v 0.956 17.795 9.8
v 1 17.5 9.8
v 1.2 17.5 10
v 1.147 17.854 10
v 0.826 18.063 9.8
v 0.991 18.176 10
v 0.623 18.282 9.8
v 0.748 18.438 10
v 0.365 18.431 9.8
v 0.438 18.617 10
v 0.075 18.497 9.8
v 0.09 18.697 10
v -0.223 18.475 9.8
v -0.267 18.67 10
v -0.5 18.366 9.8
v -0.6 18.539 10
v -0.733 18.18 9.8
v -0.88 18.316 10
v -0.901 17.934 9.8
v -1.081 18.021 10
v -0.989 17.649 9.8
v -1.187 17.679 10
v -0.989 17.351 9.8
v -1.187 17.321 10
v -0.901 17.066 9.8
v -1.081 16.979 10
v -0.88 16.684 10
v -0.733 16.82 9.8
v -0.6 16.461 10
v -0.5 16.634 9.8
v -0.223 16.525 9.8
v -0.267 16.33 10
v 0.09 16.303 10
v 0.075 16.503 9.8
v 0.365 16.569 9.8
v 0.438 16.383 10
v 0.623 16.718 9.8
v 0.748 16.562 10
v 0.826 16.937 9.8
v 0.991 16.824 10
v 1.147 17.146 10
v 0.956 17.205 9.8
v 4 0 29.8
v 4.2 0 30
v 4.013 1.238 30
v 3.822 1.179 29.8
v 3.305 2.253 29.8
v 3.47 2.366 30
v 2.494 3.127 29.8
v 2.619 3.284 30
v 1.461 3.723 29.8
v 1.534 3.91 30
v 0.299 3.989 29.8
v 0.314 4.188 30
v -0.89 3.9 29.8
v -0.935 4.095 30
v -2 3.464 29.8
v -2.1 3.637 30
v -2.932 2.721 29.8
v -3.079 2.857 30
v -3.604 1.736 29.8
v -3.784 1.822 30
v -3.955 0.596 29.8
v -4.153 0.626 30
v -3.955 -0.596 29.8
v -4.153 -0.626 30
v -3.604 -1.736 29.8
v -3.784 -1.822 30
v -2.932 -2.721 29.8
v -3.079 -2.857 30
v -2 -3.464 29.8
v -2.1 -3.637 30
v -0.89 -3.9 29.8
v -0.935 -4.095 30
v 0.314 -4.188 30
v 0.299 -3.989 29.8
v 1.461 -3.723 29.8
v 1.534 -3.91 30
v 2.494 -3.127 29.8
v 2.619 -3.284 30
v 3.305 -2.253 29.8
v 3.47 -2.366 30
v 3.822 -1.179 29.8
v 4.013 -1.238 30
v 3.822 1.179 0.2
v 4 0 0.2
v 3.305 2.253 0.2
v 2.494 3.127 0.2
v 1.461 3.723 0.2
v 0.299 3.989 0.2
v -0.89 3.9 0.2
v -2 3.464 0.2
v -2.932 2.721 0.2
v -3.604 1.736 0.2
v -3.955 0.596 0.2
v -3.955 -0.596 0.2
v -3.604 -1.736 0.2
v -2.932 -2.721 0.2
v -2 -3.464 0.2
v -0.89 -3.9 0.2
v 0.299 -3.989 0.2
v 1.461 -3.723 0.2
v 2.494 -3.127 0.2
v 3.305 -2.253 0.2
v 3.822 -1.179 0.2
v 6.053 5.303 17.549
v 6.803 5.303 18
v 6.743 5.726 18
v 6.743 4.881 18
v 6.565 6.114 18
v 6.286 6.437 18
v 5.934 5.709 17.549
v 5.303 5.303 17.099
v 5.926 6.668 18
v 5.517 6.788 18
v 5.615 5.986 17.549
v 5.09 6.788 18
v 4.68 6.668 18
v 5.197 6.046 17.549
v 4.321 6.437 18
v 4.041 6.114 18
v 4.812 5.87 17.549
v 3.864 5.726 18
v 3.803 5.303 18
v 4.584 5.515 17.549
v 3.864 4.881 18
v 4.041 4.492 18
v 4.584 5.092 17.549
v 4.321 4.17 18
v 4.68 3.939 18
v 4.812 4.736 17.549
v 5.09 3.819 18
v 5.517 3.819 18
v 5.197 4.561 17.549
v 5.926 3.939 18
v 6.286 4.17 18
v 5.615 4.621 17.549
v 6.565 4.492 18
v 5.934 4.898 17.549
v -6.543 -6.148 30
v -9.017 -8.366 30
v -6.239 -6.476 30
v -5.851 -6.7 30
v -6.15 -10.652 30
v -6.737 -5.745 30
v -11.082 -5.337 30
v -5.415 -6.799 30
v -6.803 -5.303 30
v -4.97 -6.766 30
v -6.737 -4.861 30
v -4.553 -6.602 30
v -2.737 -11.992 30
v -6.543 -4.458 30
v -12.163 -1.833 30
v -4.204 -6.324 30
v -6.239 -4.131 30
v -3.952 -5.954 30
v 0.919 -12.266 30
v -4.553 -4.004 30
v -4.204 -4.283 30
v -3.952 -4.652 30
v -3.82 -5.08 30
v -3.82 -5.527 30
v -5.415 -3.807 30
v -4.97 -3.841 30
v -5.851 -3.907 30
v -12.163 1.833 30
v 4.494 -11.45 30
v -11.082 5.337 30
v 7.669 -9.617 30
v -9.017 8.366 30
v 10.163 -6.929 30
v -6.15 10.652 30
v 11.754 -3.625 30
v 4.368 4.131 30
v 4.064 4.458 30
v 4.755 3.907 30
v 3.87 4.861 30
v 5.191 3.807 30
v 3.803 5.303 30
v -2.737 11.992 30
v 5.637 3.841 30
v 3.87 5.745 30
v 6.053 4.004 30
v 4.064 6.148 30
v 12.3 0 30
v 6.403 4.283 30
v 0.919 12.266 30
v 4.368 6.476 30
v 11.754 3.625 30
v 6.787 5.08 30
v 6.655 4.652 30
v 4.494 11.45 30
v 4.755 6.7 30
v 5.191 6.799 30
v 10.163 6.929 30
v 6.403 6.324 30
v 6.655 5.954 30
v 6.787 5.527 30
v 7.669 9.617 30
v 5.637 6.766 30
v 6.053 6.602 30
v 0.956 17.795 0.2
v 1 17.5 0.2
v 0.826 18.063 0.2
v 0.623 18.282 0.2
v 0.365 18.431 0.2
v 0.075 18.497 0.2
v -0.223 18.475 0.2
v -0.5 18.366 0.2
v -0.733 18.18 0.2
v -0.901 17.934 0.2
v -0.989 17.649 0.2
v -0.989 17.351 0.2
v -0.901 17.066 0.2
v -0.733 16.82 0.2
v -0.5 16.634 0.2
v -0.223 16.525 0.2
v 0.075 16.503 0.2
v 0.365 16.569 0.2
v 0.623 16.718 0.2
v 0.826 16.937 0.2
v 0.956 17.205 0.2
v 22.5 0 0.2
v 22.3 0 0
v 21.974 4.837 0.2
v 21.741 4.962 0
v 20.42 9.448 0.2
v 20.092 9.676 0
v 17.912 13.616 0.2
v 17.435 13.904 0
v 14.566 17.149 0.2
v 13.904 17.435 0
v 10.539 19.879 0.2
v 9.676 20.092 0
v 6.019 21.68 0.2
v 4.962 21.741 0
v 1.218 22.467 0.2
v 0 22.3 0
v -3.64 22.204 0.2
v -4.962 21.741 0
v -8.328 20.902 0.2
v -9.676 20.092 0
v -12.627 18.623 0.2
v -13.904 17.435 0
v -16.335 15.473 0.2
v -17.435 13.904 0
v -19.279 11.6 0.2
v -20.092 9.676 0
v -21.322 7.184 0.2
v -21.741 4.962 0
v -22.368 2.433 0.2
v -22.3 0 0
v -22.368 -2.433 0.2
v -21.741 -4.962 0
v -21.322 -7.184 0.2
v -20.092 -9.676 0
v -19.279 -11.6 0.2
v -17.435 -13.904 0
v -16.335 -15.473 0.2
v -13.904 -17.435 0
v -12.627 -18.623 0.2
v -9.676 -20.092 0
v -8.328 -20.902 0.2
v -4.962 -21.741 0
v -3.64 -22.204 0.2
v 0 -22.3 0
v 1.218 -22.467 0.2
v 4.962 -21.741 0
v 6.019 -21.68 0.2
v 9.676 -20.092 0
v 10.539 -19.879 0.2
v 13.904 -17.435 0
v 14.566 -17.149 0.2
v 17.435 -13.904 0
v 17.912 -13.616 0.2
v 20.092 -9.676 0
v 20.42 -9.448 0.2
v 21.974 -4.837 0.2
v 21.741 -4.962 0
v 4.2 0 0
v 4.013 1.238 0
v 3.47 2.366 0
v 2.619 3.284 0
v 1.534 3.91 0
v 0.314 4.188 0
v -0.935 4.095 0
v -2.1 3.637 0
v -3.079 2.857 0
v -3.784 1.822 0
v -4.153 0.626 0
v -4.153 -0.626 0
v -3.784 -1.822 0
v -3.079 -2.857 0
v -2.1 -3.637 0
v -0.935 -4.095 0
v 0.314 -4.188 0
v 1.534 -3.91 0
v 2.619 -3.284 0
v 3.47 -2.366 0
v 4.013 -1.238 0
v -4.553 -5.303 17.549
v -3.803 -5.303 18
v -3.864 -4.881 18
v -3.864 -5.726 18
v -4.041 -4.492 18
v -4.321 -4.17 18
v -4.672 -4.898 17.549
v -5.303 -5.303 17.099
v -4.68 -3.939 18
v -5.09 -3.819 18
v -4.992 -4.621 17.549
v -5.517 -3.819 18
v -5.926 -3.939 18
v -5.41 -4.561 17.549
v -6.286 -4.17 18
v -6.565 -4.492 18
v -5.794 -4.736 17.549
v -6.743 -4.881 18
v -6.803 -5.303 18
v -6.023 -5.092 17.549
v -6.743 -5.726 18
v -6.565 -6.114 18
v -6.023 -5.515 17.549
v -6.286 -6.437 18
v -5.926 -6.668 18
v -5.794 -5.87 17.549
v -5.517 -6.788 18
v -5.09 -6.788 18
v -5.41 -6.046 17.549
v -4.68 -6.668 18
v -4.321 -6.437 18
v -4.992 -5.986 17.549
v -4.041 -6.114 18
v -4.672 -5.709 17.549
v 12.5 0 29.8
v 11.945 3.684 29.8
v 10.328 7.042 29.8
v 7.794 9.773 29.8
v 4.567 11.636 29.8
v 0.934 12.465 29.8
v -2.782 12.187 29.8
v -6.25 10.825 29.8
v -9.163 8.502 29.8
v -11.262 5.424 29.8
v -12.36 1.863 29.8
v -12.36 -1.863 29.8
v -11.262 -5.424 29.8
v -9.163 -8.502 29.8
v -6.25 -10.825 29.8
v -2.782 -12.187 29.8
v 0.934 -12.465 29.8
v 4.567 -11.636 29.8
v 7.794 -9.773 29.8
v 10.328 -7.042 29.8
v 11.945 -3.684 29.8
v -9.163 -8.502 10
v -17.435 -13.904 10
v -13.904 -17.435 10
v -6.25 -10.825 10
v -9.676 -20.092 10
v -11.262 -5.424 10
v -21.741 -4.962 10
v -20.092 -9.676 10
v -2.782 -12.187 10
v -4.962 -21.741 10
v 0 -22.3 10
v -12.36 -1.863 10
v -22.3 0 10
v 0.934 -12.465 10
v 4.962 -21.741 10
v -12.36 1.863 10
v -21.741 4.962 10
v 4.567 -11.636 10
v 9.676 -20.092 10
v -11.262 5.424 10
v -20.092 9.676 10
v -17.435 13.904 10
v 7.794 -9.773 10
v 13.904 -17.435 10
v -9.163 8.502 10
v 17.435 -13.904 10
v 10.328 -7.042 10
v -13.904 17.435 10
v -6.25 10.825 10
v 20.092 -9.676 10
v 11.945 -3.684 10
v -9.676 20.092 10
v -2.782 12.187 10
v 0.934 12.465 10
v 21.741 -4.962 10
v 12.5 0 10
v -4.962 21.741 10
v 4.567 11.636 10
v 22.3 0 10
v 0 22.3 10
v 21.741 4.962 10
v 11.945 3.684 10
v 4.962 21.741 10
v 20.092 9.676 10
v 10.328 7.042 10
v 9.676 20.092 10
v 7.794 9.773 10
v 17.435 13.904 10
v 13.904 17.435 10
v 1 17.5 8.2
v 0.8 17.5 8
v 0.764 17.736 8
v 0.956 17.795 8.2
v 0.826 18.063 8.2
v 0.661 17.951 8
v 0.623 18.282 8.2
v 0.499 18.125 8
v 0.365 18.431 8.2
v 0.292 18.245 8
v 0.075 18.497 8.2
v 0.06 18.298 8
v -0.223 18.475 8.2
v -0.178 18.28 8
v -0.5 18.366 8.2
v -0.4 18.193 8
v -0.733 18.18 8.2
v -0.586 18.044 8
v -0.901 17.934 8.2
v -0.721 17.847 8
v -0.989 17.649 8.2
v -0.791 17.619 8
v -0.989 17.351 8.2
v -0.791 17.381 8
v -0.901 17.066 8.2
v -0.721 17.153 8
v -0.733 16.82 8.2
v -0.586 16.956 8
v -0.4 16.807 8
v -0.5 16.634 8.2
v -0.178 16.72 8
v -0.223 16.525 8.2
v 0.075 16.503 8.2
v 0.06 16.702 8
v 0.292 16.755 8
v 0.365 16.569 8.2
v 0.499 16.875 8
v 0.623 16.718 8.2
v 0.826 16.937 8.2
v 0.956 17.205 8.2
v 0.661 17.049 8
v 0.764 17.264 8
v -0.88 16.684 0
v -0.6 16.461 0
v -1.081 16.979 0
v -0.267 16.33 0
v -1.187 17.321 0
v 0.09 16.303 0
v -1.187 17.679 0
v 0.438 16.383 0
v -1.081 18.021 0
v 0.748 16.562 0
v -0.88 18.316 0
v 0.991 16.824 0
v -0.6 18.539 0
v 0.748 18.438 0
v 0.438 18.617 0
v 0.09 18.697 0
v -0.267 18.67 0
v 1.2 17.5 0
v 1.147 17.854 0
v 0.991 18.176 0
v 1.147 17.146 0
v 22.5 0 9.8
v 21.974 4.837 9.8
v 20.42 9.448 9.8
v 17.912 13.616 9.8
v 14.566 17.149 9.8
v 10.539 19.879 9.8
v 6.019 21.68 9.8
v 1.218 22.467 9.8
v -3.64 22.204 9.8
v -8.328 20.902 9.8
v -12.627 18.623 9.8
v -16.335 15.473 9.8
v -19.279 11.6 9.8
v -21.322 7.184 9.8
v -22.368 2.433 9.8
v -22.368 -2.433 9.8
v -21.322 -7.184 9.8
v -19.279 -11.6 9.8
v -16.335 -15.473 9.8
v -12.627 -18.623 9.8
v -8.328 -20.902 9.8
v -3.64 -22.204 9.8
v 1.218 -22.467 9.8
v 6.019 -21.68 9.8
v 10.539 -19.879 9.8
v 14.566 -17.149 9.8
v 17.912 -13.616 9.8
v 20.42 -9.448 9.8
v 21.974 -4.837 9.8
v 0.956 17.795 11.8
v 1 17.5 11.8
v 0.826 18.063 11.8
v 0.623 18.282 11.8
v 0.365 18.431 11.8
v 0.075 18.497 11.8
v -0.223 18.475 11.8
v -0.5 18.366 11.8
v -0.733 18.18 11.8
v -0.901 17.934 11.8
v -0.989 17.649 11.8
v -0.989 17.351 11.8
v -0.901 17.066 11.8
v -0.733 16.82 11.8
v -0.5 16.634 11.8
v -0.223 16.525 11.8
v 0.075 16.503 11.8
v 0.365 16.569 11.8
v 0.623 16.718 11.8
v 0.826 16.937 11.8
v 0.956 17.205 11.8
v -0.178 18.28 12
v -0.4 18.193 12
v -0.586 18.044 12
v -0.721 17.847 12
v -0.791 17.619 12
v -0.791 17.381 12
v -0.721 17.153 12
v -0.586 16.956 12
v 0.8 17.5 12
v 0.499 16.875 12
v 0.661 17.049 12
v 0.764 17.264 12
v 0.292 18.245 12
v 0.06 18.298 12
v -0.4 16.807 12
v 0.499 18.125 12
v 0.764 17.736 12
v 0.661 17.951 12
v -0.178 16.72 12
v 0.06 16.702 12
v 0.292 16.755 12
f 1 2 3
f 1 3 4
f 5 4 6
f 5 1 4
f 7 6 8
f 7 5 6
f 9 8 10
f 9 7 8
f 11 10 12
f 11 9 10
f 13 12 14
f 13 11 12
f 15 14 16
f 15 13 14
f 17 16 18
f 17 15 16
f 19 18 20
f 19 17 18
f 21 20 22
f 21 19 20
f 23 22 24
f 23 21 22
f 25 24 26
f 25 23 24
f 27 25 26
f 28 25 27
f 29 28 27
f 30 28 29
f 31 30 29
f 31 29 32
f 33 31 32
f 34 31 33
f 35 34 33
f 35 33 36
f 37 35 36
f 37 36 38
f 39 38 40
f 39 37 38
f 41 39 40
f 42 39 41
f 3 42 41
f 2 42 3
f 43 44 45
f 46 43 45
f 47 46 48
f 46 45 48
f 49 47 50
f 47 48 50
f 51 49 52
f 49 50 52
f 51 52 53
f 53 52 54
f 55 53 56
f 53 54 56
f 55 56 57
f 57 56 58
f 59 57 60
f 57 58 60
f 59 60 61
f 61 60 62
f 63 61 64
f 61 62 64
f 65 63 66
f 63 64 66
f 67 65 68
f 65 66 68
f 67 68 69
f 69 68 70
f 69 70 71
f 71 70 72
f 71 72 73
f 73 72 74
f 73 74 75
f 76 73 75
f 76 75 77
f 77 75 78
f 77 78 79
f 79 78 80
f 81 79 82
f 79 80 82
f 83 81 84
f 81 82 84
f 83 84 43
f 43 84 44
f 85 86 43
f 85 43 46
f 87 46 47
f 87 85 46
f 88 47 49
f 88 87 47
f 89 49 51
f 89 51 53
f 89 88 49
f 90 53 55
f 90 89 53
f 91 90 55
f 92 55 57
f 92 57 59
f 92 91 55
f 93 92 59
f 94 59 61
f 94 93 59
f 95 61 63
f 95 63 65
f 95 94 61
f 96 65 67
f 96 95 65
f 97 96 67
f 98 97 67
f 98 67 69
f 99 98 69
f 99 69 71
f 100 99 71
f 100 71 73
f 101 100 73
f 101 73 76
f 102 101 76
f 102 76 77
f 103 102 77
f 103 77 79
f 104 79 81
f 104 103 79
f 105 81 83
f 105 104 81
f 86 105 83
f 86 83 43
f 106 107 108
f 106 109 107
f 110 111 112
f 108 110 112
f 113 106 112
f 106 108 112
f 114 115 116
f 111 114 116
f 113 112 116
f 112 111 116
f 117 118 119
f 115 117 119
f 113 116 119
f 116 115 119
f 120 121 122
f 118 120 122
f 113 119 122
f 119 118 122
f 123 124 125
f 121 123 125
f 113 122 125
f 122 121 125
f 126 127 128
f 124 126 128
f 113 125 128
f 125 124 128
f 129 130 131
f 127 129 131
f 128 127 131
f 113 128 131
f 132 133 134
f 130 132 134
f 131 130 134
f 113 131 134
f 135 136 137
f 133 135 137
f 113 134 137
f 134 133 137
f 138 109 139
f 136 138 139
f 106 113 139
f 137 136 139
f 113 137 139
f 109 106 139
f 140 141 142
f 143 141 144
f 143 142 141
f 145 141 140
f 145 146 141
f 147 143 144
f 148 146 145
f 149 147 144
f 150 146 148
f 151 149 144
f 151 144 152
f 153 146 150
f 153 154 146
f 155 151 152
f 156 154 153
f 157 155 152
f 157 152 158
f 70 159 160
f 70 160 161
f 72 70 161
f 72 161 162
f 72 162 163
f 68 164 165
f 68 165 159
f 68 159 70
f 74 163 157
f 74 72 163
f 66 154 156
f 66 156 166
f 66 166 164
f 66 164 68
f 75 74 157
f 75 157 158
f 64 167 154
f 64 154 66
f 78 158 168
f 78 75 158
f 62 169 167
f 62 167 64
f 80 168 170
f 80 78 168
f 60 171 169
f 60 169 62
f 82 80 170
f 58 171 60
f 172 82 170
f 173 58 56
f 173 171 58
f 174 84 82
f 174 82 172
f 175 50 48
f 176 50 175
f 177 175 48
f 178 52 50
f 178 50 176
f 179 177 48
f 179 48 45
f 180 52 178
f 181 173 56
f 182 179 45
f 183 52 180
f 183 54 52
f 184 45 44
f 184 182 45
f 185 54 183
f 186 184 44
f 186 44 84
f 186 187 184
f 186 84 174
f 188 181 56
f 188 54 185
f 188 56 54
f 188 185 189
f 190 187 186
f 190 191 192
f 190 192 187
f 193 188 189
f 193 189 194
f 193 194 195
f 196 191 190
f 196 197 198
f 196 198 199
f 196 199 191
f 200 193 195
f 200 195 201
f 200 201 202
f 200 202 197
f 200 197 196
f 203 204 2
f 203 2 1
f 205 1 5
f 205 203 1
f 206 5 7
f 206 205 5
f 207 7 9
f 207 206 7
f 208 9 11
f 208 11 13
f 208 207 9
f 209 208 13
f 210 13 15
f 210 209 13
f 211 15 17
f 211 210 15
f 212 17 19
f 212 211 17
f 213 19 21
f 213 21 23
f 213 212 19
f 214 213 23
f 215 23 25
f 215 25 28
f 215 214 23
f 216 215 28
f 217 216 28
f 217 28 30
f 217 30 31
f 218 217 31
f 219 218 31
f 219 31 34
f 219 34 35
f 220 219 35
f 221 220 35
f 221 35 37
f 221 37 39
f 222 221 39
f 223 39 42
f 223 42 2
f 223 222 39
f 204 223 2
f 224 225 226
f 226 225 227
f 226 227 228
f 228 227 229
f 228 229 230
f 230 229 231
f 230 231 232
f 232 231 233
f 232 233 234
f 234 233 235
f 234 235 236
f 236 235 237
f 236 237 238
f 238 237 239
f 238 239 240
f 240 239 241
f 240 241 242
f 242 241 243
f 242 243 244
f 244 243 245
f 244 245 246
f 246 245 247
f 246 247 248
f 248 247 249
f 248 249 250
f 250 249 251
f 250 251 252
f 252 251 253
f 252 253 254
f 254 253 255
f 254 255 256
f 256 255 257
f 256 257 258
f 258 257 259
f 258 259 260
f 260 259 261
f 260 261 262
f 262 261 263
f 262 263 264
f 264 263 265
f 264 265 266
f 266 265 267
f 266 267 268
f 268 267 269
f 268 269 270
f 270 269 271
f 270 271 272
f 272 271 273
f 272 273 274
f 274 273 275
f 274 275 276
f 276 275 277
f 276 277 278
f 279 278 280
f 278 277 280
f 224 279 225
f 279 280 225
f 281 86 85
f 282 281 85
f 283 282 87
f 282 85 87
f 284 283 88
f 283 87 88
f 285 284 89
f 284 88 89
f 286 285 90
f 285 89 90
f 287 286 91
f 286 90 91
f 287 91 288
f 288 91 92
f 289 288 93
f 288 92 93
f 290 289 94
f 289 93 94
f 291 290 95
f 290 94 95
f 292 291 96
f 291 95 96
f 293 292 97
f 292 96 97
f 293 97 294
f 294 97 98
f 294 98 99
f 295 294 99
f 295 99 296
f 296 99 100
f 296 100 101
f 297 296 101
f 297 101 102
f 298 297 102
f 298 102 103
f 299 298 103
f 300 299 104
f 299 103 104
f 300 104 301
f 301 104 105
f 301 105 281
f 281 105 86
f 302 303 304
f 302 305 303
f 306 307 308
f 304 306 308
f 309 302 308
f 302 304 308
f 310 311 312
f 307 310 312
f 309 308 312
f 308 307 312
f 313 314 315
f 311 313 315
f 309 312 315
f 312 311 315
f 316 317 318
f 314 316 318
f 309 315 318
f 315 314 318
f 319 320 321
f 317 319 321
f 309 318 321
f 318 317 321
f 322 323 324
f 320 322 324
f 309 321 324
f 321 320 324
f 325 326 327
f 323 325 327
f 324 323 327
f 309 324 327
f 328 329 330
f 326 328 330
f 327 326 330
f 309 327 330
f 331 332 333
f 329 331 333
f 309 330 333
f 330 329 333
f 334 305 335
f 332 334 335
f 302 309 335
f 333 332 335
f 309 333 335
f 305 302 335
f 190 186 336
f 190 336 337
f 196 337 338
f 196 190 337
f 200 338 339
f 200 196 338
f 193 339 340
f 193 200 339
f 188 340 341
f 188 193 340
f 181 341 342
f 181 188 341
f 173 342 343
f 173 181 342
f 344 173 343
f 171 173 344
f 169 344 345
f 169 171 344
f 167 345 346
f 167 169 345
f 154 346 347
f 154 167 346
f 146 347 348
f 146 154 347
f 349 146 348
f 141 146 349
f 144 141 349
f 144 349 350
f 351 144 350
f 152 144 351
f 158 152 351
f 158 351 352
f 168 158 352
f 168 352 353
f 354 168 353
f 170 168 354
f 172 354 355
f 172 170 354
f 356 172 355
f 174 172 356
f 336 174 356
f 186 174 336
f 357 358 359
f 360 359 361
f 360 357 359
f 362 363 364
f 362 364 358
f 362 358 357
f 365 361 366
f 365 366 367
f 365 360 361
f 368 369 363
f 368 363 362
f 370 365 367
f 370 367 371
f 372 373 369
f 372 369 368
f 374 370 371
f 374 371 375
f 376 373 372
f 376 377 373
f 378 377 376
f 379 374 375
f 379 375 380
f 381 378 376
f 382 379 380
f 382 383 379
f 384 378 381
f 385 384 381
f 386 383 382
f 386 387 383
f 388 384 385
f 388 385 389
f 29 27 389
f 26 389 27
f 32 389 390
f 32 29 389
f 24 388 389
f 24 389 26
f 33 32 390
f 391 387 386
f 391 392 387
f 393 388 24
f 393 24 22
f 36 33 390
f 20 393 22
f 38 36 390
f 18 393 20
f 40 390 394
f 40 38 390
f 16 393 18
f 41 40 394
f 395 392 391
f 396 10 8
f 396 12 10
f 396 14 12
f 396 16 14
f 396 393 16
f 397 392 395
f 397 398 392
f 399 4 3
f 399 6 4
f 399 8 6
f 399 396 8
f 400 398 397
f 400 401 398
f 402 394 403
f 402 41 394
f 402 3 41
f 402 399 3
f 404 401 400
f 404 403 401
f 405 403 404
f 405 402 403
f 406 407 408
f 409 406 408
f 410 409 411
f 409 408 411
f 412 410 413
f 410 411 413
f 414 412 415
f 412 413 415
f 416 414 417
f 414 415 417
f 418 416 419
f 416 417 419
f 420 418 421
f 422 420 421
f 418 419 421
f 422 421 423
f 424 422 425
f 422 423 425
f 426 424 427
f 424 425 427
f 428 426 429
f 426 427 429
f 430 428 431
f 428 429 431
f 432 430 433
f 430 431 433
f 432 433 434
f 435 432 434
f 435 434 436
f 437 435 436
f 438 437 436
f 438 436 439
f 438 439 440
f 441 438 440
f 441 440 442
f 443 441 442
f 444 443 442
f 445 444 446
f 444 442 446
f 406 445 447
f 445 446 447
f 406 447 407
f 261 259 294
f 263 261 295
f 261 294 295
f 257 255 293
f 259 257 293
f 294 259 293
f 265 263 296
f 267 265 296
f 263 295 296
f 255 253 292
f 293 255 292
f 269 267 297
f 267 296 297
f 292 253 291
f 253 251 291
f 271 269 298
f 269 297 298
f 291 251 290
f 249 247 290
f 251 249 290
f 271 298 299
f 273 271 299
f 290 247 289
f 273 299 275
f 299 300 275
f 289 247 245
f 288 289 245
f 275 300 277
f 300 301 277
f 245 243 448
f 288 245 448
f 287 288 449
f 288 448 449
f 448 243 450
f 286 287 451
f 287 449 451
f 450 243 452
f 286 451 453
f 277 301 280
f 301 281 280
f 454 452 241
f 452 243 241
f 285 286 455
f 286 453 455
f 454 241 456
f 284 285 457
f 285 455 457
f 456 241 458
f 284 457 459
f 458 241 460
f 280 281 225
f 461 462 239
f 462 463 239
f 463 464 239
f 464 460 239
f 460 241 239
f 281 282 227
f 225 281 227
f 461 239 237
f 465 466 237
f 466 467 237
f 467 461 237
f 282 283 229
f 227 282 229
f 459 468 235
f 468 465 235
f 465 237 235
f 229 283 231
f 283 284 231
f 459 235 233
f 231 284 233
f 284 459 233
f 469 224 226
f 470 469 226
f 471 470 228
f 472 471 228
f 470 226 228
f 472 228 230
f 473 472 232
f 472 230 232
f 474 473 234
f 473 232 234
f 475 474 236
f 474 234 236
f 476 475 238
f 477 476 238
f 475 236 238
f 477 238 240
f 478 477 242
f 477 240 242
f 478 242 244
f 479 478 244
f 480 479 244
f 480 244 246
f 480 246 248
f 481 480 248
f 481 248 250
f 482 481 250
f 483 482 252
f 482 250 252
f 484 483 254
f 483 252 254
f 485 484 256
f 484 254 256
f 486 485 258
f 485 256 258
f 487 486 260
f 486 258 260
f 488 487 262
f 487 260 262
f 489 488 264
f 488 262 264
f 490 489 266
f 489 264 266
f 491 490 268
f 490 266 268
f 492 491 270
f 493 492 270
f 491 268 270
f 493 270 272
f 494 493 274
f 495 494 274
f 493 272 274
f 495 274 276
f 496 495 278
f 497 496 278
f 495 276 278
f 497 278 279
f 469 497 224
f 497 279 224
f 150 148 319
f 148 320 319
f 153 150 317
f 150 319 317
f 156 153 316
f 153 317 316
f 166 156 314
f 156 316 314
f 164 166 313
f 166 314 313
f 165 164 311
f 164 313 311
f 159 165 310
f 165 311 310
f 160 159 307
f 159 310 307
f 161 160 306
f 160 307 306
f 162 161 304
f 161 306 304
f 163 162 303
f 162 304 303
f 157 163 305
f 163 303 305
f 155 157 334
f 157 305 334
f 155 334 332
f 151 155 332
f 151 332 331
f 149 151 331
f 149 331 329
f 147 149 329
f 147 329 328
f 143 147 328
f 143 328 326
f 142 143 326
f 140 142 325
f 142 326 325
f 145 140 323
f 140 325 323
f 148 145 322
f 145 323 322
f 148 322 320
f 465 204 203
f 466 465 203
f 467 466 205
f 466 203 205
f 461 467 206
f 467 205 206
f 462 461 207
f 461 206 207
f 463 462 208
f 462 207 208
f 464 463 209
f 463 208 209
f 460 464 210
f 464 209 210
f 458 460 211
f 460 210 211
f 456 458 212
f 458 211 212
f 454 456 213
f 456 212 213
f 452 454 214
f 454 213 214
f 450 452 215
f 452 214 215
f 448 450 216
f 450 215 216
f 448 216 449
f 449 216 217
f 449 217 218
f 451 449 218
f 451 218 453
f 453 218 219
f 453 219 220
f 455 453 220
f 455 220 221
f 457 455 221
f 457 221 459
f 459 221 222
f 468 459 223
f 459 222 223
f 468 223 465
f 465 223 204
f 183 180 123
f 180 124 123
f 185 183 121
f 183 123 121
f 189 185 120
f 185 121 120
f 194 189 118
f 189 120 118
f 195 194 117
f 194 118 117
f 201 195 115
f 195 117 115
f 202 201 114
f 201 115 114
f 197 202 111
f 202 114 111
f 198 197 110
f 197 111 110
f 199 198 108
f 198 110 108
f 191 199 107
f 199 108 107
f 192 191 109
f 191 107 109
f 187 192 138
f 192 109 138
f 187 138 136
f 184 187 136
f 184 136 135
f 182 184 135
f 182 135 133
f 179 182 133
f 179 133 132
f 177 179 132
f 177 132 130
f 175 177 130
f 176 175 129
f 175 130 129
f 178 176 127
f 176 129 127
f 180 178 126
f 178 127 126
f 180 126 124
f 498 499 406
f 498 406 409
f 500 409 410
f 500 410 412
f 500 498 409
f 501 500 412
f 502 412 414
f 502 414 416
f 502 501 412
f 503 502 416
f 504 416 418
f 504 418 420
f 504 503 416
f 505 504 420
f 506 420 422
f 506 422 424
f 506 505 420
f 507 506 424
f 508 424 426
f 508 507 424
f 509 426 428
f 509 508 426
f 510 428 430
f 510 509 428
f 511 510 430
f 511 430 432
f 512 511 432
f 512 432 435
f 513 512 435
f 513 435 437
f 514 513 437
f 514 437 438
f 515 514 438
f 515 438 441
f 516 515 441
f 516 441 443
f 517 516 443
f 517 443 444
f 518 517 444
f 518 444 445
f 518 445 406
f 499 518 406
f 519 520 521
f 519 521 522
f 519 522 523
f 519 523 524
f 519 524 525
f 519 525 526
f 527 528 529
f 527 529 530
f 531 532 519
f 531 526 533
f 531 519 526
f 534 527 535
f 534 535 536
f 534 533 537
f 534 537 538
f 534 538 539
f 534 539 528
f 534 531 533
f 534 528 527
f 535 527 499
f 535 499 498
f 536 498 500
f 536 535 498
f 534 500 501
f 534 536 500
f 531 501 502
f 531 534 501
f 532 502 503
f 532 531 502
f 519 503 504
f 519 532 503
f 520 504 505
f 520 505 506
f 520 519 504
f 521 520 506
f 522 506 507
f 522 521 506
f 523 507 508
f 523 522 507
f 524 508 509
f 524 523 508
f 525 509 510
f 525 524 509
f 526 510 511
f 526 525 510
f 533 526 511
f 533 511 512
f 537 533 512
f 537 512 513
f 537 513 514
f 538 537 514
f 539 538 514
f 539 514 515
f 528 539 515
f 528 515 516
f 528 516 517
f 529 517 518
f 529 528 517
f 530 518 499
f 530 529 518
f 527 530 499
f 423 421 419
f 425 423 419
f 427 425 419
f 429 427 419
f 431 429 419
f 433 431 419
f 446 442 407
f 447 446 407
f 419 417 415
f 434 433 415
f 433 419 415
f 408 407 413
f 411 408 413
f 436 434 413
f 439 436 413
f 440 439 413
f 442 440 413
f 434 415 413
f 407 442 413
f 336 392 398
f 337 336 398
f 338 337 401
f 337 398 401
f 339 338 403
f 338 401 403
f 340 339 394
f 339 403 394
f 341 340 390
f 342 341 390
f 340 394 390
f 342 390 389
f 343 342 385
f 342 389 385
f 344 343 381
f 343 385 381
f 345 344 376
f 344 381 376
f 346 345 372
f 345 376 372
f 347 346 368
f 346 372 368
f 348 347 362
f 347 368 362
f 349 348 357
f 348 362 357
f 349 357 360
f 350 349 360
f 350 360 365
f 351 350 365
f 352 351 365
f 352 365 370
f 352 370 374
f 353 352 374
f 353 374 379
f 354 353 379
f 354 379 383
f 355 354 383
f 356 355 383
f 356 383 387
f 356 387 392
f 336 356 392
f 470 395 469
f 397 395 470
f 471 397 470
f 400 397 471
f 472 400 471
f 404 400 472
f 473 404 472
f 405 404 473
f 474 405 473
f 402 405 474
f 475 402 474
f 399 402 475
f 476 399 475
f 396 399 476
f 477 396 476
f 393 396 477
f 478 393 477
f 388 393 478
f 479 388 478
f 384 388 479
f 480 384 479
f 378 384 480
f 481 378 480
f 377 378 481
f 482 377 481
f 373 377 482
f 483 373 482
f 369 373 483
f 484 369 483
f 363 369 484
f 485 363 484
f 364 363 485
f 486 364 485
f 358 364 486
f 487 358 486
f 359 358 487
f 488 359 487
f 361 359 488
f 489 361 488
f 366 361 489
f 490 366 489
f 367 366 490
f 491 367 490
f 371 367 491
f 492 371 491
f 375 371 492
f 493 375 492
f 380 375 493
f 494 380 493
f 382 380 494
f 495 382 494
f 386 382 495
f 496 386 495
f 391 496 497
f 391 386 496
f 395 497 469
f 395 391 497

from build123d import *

# Parameters (mm, degrees)
F0_R     = 12.5
F0_R_2   = 4
F1_DEPTH = 30
F0_R_3   = 22.5
F0_R_4   = 1
F2_DEPTH = 10
F3_R     = 1
F4_DEPTH = 2
F5_SIZE  = 0.2
F6_SIZE  = 0.2
F8_D     = 3
F8_DEPTH = 12
F8_TIP   = 0.9012909285


with BuildPart() as f1:
    # F0 (on Top) → F1 (new body)
    with BuildSketch(Plane.XY):
        Circle(F0_R)
        Circle(F0_R_2, mode=Mode.SUBTRACT)
    extrude(amount=F1_DEPTH)

    # F0 (on Top) → F2 (join)
    with BuildSketch(Plane.XY):
        Circle(F0_R_3)
        Circle(F0_R, mode=Mode.SUBTRACT)
        with Locations((0, 17.5)):
            Circle(F0_R_4, mode=Mode.SUBTRACT)
    extrude(amount=F2_DEPTH)

    # F6
    f6_edges = [f1.edges().sort_by_distance(p)[0] for p in [
        (-12.5, 0, 30),
        (-4, 0, 30),
        (-22.5, 0, 10),
        (-4, 0, 0),
        (-1, 17.5, 0),
        (-1, 17.5, 10),
        (-22.5, 0, 0),
    ]]
    chamfer(f6_edges, length=F6_SIZE)

    # F8
    with Locations(Plane.XY.offset(30)):
        with Locations((5.3033008589, 5.3033008589), (-5.3033008589, -5.3033008589)):
            Hole(F8_D / 2, depth=F8_DEPTH)
            with Locations((0, 0, -(F8_DEPTH + F8_TIP / 2))):  # 118° drill point
                Cone(0, F8_D / 2, F8_TIP, mode=Mode.SUBTRACT)


with BuildPart() as f4:
    # F3 (on face) → F4 (new body, symmetric)
    with BuildSketch(Plane.XY.offset(10)):
        with Locations((0, 17.5)):
            Circle(F3_R)
    extrude(amount=F4_DEPTH, both=True)

    # F5
    f5_edges = [f4.edges().sort_by_distance(p)[0] for p in [
        (-1, 17.5, 12),
        (-1, 17.5, 8),
    ]]
    chamfer(f5_edges, length=F5_SIZE)


solid = Compound([f1.part, f4.part])
